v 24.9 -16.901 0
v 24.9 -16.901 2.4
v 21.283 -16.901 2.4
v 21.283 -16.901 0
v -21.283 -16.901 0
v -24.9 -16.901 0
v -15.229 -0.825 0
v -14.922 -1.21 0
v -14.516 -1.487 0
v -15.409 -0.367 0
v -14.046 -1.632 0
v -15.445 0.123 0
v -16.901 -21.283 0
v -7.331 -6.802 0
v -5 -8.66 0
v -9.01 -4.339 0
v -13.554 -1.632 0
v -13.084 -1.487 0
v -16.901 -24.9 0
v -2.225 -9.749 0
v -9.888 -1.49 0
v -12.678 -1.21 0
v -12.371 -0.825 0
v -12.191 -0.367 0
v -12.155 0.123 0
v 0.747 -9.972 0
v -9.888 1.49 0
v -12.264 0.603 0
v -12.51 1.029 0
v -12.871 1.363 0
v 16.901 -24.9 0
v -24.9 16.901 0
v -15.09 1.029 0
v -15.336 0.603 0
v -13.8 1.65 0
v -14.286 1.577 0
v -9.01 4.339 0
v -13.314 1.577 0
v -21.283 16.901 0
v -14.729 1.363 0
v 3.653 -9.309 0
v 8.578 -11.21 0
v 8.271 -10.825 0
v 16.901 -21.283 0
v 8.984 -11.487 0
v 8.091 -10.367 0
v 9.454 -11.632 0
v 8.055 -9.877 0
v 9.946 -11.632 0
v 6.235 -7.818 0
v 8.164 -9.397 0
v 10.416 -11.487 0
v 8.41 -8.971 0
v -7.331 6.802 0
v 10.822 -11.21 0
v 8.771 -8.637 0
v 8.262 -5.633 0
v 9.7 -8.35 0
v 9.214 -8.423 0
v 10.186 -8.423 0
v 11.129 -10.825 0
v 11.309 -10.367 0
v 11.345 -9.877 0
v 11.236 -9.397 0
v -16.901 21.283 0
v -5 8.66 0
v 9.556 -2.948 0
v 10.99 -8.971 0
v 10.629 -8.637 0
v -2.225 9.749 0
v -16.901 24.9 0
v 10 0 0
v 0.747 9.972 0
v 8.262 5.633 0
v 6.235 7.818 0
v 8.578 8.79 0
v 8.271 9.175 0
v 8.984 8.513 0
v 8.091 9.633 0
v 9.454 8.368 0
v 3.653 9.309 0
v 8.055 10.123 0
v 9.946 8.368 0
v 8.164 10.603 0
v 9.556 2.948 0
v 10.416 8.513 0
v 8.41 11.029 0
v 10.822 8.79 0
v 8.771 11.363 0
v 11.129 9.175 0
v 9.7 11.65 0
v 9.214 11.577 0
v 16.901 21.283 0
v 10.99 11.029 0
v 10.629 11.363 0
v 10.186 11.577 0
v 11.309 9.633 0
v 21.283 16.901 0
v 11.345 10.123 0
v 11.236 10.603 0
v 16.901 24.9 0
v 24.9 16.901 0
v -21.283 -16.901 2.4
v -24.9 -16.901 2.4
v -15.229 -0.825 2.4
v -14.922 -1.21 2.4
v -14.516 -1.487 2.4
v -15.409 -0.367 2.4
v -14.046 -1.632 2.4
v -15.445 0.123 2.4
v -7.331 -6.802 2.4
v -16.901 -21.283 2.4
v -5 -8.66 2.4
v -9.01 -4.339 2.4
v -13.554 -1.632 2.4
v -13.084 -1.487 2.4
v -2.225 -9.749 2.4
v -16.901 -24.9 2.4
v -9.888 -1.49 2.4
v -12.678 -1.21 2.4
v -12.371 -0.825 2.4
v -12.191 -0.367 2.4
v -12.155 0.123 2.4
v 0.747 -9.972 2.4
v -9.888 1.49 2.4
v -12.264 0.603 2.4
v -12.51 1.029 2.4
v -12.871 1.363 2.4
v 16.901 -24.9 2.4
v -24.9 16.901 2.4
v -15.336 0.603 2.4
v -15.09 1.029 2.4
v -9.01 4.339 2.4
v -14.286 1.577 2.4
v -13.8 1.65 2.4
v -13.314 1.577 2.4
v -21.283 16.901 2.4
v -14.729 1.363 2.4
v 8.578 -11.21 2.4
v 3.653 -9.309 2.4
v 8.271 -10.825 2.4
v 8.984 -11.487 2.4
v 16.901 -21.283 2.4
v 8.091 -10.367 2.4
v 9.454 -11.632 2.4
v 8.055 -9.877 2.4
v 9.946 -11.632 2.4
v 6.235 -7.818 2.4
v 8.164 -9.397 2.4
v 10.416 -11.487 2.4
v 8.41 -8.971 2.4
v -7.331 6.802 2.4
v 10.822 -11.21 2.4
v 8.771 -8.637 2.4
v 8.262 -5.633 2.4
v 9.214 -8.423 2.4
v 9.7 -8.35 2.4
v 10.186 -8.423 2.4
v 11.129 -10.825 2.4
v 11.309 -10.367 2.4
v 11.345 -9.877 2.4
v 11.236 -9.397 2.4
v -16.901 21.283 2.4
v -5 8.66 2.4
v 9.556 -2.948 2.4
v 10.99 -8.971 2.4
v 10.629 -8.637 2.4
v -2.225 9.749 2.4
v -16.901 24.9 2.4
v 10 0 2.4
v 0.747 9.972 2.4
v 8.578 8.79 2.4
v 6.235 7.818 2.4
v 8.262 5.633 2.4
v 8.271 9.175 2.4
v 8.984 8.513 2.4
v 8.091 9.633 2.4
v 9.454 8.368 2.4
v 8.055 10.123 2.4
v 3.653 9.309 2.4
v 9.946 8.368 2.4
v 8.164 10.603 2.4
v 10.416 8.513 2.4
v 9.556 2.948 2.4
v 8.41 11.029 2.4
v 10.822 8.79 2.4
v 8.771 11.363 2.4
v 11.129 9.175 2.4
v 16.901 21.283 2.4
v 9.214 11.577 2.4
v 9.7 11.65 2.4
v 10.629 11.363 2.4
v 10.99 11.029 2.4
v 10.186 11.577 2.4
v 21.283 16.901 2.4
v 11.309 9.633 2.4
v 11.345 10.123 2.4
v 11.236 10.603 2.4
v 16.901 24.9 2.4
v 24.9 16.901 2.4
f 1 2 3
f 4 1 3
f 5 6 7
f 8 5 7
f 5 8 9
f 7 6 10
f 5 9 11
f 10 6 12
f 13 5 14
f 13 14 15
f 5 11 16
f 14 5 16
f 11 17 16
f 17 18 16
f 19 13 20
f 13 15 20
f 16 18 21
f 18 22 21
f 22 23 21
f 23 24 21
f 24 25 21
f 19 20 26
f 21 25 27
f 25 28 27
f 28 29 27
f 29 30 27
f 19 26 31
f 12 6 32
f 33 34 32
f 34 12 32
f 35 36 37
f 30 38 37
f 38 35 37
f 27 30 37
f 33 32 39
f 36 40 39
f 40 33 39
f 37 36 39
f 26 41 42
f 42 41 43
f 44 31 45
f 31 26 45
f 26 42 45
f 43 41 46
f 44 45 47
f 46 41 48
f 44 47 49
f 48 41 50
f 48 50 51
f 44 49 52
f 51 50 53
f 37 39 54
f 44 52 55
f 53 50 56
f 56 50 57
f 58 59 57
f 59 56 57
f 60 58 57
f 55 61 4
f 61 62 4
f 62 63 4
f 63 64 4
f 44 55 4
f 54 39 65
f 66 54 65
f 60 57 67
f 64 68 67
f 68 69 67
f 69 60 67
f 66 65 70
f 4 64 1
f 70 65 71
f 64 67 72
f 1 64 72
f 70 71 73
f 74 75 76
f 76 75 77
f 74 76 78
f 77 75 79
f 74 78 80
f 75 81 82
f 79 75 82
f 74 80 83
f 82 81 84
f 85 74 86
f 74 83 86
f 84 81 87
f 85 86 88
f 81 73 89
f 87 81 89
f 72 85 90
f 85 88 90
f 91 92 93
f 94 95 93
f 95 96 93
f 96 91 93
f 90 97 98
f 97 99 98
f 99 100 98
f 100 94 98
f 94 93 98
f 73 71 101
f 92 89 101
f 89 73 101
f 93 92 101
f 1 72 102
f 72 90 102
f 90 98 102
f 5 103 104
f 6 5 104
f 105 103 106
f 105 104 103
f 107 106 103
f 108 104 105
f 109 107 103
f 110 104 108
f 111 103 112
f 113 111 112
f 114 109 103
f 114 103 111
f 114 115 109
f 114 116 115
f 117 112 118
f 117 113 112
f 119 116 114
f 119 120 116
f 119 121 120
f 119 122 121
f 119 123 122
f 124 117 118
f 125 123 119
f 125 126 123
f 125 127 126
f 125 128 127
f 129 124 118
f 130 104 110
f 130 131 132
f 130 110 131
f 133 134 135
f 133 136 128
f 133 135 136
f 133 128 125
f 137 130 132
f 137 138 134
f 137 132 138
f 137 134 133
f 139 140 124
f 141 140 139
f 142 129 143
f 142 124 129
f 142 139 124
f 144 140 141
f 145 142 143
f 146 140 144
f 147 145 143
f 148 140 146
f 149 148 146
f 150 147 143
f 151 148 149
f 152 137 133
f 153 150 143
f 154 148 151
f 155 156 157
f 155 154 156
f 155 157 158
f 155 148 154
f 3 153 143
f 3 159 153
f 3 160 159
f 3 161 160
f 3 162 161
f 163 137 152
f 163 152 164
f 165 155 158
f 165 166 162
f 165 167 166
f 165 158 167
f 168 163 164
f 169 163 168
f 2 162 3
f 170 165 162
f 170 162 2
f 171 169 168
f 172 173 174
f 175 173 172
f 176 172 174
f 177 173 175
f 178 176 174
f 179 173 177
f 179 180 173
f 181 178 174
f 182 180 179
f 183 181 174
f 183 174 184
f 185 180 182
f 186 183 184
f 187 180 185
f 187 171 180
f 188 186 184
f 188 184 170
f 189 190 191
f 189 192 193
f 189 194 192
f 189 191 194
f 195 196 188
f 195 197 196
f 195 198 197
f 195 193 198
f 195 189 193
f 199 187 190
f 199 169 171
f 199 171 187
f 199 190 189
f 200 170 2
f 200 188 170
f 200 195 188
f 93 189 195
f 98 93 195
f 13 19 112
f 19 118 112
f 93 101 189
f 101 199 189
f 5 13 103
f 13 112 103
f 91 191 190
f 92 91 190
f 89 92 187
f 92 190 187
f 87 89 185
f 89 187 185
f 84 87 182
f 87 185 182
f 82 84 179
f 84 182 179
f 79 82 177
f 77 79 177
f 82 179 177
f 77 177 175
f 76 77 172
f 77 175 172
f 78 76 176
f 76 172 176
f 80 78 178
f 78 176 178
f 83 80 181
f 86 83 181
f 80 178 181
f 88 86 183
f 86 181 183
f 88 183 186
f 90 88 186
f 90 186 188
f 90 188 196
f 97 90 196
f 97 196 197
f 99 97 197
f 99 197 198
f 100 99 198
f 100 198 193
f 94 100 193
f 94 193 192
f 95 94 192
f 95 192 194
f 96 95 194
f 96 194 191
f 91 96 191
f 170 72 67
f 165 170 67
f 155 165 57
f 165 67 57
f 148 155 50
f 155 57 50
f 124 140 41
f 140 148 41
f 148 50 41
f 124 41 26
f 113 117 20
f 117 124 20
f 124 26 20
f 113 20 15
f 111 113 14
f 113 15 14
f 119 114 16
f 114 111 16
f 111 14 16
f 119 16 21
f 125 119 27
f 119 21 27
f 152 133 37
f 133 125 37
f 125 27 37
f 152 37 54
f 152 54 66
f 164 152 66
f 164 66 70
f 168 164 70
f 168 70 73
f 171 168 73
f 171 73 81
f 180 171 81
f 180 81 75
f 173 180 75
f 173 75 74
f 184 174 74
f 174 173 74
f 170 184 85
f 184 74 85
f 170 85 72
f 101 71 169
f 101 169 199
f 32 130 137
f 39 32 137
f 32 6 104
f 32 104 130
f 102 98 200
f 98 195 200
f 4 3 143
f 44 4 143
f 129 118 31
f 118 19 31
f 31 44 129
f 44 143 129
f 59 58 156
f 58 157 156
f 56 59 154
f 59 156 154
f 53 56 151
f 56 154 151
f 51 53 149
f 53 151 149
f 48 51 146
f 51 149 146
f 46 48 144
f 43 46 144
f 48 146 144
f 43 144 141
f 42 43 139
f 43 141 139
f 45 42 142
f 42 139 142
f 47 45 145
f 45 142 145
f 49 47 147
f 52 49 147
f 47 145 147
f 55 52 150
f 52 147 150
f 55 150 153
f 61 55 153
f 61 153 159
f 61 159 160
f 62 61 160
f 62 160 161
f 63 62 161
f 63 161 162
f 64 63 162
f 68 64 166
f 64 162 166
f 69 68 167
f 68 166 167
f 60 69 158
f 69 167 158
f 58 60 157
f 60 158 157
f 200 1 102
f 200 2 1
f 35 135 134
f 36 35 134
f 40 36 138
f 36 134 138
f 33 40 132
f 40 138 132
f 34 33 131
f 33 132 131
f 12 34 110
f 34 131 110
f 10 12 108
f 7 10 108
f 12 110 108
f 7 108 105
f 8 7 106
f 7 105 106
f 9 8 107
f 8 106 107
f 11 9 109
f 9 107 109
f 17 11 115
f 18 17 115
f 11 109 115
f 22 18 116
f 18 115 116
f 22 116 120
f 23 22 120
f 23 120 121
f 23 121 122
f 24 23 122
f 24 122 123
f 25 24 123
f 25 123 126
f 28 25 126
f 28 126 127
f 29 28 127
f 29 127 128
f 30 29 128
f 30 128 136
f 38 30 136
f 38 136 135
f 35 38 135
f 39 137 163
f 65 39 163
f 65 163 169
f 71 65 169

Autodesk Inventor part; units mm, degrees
ref_plane "YZ Plane" through (0, 0, 0) normal (1, 0, 0) x (0, 1, 0)
ref_plane "XZ Plane" through (0, 0, 0) normal (0, 1, 0) x (-1, 0, 0)
ref_plane "Work Plane1" through (-29.1, -14.5, 2.4) normal (0, 0, -1) x (0, 1, 0)
sketch "Sketch1" plane through (0, 0, 0) normal (0, 0, 1) x (1, 0, 0)
  line L0 (-34.86, 0) -> (34.86, 0) construction
  line L1 (0, -34.86) -> (0, 34.86) construction
  line L2 (0, 0) -> (11.1575, 11.1575) construction
  line L3 (0, 0) -> (15.7791, 0) construction
  line L4 (0, 24.9) -> (16.8009, 24.9)
  line L5 (16.8009, 24.9) -> (16.8009, 21.2415)
  line L6 (16.8009, 21.2415) -> (19.0212, 19.0212)
  line L7 (24.9, 0) -> (24.9, 16.8009)
  line L8 (24.9, 16.8009) -> (21.2415, 16.8009)
  line L9 (21.2415, 16.8009) -> (19.0212, 19.0212)
  line L10 (0, -24.9) -> (16.8009, -24.9)
  line L11 (16.8009, -24.9) -> (16.8009, -21.2415)
  line L12 (16.8009, -21.2415) -> (19.0212, -19.0212)
  line L13 (24.9, 0) -> (24.9, -16.8009)
  line L14 (24.9, -16.8009) -> (21.2415, -16.8009)
  line L15 (21.2415, -16.8009) -> (19.0212, -19.0212)
  line L16 (0, 24.9) -> (-16.8009, 24.9)
  line L17 (-16.8009, 24.9) -> (-16.8009, 21.2415)
  line L18 (-16.8009, 21.2415) -> (-19.0212, 19.0212)
  line L19 (-24.9, 16.8009) -> (-21.2415, 16.8009)
  line L20 (-21.2415, 16.8009) -> (-19.0212, 19.0212)
  line L21 (0, -24.9) -> (-16.8009, -24.9)
  line L22 (-16.8009, -24.9) -> (-16.8009, -21.2415)
  line L23 (-16.8009, -21.2415) -> (-19.0212, -19.0212)
  line L24 (-21.2415, -16.8009) -> (-19.0212, -19.0212)
  line L25 (-24.9, -16.8009) -> (-21.2415, -16.8009)
  line L26 (-24.9, 0) -> (-24.9, -16.8009)
  line L27 (-24.9, 0) -> (-24.9, 16.8009)
  circle A0 centre (0, 0) radius 10
  dimension "d0" = 45
  dimension "d2" = 24.9
  dimension "d3" = 3.14
  dimension "d4" = 26.9
  dimension "d5" = 20
extrude "Extrusion1" add sketch "Sketch1" along normal up to surface (2.4 mm away)
sketch "Sketch5" plane through (0, 0, 0) normal (0, 0, -1) x (-1, 0, 0)
  circle A0 centre (-9.7, 10) radius 1.4
  circle A1 centre (-9.7, -10) radius 1.4
  circle A2 centre (13.8, 0) radius 1.4
  point P0 (0, 0)
hole "Hole1" at (9.7, 10, 0) at (-13.8, 0, 0) at (9.7, -10, 0) direction (0, 0, 1) diameter 3.3 depth 12 tip angle 118
sketch "Skizze6" plane through (-16.8009, 24.9, 2.4) normal (0, 0, 1) x (1, 0, 0)
  circle A0 centre (3.0009, -24.9) radius 1.65 construction
  circle A1 centre (26.5009, -14.9) radius 1.65 construction
  circle A2 centre (26.5009, -34.9) radius 1.65 construction
  circle A3 centre (16.8009, -24.9) radius 10 construction
  line L0 (33.6017, -3.6585) -> (33.6017, 0) projected
  line L1 (33.6017, 0) -> (0, 0) construction
  line L2 (0, 0) -> (0, -3.6585) projected
  line L3 (0, -3.6585) -> (-4.4406, -8.0991) projected
  line L4 (-4.4406, -8.0991) -> (-8.0991, -8.0991) projected
  line L5 (-8.0991, -8.0991) -> (-8.0991, -41.7009) construction
  line L6 (-8.0991, -41.7009) -> (-4.4406, -41.7009) projected
  line L7 (-4.4406, -41.7009) -> (0, -46.1415) projected
  line L8 (0, -46.1415) -> (0, -49.8) projected
  line L9 (0, -49.8) -> (33.6017, -49.8) construction
  line L10 (33.6017, -49.8) -> (33.6017, -46.1415) projected
  line L11 (33.6017, -46.1415) -> (38.0423, -41.7009) projected
  line L12 (38.0423, -41.7009) -> (41.7009, -41.7009) projected
  line L13 (41.7009, -41.7009) -> (41.7009, -8.0991) construction
  line L14 (41.7009, -8.0991) -> (38.0423, -8.0991) projected
  line L15 (38.0423, -8.0991) -> (33.6017, -3.6585) projected
  line L16 (-0.1, 0.1) -> (33.7017, 0.1) construction
  line L17 (33.7017, 0.1) -> (33.7017, -3.6171)
  line L18 (33.7017, -3.6171) -> (38.0838, -7.9991)
  line L19 (38.0838, -7.9991) -> (41.8009, -7.9991)
  line L20 (41.8009, -7.9991) -> (41.8009, -41.8009) construction
  line L21 (41.8009, -41.8009) -> (38.0838, -41.8009)
  line L22 (38.0838, -41.8009) -> (33.7017, -46.1829)
  line L23 (33.7017, -46.1829) -> (33.7017, -49.9)
  line L24 (33.7017, -49.9) -> (-0.1, -49.9) construction
  line L25 (-0.1, -49.9) -> (-0.1, -46.1829)
  line L26 (-0.1, -46.1829) -> (-4.4821, -41.8009)
  line L27 (-4.4821, -41.8009) -> (-8.1991, -41.8009)
  line L28 (-8.1991, -41.8009) -> (-8.1991, -7.9991) construction
  line L29 (-8.1991, -7.9991) -> (-4.4821, -7.9991)
  line L30 (-4.4821, -7.9991) -> (-0.1, -3.6171)
  line L31 (-0.1, -3.6171) -> (-0.1, 0.1)
  line L32 (-8.0991, -8.0991) -> (-8.0991, -7.9991)
  line L33 (0, -3.6585) -> (0, 0) projected
  line L34 (0, 0) -> (-0.1, 0)
  line L35 (33.6017, 0) -> (33.6017, -3.6585) projected
  line L36 (33.6017, 0) -> (33.7017, 0)
  line L37 (41.7009, -8.0991) -> (41.7009, -7.9991)
  line L38 (41.7009, -41.7009) -> (41.7009, -8.0991) projected
  line L39 (41.7009, -41.7009) -> (41.7009, -41.8009)
  line L40 (33.6017, -49.8) -> (0, -49.8) projected
  line L41 (33.6017, -49.8) -> (33.7017, -49.8)
  line L42 (0, -49.8) -> (-0.1, -49.8)
  line L43 (-8.0991, -41.7009) -> (-8.0991, -41.8009)
  dimension "d25" = 0.1
extrude "IM_offset" add sketch "Skizze6" against normal up to surface (2.4 mm away)
properties part number "20_Cube_insert_Basler_acA1920_25gm_v3"
